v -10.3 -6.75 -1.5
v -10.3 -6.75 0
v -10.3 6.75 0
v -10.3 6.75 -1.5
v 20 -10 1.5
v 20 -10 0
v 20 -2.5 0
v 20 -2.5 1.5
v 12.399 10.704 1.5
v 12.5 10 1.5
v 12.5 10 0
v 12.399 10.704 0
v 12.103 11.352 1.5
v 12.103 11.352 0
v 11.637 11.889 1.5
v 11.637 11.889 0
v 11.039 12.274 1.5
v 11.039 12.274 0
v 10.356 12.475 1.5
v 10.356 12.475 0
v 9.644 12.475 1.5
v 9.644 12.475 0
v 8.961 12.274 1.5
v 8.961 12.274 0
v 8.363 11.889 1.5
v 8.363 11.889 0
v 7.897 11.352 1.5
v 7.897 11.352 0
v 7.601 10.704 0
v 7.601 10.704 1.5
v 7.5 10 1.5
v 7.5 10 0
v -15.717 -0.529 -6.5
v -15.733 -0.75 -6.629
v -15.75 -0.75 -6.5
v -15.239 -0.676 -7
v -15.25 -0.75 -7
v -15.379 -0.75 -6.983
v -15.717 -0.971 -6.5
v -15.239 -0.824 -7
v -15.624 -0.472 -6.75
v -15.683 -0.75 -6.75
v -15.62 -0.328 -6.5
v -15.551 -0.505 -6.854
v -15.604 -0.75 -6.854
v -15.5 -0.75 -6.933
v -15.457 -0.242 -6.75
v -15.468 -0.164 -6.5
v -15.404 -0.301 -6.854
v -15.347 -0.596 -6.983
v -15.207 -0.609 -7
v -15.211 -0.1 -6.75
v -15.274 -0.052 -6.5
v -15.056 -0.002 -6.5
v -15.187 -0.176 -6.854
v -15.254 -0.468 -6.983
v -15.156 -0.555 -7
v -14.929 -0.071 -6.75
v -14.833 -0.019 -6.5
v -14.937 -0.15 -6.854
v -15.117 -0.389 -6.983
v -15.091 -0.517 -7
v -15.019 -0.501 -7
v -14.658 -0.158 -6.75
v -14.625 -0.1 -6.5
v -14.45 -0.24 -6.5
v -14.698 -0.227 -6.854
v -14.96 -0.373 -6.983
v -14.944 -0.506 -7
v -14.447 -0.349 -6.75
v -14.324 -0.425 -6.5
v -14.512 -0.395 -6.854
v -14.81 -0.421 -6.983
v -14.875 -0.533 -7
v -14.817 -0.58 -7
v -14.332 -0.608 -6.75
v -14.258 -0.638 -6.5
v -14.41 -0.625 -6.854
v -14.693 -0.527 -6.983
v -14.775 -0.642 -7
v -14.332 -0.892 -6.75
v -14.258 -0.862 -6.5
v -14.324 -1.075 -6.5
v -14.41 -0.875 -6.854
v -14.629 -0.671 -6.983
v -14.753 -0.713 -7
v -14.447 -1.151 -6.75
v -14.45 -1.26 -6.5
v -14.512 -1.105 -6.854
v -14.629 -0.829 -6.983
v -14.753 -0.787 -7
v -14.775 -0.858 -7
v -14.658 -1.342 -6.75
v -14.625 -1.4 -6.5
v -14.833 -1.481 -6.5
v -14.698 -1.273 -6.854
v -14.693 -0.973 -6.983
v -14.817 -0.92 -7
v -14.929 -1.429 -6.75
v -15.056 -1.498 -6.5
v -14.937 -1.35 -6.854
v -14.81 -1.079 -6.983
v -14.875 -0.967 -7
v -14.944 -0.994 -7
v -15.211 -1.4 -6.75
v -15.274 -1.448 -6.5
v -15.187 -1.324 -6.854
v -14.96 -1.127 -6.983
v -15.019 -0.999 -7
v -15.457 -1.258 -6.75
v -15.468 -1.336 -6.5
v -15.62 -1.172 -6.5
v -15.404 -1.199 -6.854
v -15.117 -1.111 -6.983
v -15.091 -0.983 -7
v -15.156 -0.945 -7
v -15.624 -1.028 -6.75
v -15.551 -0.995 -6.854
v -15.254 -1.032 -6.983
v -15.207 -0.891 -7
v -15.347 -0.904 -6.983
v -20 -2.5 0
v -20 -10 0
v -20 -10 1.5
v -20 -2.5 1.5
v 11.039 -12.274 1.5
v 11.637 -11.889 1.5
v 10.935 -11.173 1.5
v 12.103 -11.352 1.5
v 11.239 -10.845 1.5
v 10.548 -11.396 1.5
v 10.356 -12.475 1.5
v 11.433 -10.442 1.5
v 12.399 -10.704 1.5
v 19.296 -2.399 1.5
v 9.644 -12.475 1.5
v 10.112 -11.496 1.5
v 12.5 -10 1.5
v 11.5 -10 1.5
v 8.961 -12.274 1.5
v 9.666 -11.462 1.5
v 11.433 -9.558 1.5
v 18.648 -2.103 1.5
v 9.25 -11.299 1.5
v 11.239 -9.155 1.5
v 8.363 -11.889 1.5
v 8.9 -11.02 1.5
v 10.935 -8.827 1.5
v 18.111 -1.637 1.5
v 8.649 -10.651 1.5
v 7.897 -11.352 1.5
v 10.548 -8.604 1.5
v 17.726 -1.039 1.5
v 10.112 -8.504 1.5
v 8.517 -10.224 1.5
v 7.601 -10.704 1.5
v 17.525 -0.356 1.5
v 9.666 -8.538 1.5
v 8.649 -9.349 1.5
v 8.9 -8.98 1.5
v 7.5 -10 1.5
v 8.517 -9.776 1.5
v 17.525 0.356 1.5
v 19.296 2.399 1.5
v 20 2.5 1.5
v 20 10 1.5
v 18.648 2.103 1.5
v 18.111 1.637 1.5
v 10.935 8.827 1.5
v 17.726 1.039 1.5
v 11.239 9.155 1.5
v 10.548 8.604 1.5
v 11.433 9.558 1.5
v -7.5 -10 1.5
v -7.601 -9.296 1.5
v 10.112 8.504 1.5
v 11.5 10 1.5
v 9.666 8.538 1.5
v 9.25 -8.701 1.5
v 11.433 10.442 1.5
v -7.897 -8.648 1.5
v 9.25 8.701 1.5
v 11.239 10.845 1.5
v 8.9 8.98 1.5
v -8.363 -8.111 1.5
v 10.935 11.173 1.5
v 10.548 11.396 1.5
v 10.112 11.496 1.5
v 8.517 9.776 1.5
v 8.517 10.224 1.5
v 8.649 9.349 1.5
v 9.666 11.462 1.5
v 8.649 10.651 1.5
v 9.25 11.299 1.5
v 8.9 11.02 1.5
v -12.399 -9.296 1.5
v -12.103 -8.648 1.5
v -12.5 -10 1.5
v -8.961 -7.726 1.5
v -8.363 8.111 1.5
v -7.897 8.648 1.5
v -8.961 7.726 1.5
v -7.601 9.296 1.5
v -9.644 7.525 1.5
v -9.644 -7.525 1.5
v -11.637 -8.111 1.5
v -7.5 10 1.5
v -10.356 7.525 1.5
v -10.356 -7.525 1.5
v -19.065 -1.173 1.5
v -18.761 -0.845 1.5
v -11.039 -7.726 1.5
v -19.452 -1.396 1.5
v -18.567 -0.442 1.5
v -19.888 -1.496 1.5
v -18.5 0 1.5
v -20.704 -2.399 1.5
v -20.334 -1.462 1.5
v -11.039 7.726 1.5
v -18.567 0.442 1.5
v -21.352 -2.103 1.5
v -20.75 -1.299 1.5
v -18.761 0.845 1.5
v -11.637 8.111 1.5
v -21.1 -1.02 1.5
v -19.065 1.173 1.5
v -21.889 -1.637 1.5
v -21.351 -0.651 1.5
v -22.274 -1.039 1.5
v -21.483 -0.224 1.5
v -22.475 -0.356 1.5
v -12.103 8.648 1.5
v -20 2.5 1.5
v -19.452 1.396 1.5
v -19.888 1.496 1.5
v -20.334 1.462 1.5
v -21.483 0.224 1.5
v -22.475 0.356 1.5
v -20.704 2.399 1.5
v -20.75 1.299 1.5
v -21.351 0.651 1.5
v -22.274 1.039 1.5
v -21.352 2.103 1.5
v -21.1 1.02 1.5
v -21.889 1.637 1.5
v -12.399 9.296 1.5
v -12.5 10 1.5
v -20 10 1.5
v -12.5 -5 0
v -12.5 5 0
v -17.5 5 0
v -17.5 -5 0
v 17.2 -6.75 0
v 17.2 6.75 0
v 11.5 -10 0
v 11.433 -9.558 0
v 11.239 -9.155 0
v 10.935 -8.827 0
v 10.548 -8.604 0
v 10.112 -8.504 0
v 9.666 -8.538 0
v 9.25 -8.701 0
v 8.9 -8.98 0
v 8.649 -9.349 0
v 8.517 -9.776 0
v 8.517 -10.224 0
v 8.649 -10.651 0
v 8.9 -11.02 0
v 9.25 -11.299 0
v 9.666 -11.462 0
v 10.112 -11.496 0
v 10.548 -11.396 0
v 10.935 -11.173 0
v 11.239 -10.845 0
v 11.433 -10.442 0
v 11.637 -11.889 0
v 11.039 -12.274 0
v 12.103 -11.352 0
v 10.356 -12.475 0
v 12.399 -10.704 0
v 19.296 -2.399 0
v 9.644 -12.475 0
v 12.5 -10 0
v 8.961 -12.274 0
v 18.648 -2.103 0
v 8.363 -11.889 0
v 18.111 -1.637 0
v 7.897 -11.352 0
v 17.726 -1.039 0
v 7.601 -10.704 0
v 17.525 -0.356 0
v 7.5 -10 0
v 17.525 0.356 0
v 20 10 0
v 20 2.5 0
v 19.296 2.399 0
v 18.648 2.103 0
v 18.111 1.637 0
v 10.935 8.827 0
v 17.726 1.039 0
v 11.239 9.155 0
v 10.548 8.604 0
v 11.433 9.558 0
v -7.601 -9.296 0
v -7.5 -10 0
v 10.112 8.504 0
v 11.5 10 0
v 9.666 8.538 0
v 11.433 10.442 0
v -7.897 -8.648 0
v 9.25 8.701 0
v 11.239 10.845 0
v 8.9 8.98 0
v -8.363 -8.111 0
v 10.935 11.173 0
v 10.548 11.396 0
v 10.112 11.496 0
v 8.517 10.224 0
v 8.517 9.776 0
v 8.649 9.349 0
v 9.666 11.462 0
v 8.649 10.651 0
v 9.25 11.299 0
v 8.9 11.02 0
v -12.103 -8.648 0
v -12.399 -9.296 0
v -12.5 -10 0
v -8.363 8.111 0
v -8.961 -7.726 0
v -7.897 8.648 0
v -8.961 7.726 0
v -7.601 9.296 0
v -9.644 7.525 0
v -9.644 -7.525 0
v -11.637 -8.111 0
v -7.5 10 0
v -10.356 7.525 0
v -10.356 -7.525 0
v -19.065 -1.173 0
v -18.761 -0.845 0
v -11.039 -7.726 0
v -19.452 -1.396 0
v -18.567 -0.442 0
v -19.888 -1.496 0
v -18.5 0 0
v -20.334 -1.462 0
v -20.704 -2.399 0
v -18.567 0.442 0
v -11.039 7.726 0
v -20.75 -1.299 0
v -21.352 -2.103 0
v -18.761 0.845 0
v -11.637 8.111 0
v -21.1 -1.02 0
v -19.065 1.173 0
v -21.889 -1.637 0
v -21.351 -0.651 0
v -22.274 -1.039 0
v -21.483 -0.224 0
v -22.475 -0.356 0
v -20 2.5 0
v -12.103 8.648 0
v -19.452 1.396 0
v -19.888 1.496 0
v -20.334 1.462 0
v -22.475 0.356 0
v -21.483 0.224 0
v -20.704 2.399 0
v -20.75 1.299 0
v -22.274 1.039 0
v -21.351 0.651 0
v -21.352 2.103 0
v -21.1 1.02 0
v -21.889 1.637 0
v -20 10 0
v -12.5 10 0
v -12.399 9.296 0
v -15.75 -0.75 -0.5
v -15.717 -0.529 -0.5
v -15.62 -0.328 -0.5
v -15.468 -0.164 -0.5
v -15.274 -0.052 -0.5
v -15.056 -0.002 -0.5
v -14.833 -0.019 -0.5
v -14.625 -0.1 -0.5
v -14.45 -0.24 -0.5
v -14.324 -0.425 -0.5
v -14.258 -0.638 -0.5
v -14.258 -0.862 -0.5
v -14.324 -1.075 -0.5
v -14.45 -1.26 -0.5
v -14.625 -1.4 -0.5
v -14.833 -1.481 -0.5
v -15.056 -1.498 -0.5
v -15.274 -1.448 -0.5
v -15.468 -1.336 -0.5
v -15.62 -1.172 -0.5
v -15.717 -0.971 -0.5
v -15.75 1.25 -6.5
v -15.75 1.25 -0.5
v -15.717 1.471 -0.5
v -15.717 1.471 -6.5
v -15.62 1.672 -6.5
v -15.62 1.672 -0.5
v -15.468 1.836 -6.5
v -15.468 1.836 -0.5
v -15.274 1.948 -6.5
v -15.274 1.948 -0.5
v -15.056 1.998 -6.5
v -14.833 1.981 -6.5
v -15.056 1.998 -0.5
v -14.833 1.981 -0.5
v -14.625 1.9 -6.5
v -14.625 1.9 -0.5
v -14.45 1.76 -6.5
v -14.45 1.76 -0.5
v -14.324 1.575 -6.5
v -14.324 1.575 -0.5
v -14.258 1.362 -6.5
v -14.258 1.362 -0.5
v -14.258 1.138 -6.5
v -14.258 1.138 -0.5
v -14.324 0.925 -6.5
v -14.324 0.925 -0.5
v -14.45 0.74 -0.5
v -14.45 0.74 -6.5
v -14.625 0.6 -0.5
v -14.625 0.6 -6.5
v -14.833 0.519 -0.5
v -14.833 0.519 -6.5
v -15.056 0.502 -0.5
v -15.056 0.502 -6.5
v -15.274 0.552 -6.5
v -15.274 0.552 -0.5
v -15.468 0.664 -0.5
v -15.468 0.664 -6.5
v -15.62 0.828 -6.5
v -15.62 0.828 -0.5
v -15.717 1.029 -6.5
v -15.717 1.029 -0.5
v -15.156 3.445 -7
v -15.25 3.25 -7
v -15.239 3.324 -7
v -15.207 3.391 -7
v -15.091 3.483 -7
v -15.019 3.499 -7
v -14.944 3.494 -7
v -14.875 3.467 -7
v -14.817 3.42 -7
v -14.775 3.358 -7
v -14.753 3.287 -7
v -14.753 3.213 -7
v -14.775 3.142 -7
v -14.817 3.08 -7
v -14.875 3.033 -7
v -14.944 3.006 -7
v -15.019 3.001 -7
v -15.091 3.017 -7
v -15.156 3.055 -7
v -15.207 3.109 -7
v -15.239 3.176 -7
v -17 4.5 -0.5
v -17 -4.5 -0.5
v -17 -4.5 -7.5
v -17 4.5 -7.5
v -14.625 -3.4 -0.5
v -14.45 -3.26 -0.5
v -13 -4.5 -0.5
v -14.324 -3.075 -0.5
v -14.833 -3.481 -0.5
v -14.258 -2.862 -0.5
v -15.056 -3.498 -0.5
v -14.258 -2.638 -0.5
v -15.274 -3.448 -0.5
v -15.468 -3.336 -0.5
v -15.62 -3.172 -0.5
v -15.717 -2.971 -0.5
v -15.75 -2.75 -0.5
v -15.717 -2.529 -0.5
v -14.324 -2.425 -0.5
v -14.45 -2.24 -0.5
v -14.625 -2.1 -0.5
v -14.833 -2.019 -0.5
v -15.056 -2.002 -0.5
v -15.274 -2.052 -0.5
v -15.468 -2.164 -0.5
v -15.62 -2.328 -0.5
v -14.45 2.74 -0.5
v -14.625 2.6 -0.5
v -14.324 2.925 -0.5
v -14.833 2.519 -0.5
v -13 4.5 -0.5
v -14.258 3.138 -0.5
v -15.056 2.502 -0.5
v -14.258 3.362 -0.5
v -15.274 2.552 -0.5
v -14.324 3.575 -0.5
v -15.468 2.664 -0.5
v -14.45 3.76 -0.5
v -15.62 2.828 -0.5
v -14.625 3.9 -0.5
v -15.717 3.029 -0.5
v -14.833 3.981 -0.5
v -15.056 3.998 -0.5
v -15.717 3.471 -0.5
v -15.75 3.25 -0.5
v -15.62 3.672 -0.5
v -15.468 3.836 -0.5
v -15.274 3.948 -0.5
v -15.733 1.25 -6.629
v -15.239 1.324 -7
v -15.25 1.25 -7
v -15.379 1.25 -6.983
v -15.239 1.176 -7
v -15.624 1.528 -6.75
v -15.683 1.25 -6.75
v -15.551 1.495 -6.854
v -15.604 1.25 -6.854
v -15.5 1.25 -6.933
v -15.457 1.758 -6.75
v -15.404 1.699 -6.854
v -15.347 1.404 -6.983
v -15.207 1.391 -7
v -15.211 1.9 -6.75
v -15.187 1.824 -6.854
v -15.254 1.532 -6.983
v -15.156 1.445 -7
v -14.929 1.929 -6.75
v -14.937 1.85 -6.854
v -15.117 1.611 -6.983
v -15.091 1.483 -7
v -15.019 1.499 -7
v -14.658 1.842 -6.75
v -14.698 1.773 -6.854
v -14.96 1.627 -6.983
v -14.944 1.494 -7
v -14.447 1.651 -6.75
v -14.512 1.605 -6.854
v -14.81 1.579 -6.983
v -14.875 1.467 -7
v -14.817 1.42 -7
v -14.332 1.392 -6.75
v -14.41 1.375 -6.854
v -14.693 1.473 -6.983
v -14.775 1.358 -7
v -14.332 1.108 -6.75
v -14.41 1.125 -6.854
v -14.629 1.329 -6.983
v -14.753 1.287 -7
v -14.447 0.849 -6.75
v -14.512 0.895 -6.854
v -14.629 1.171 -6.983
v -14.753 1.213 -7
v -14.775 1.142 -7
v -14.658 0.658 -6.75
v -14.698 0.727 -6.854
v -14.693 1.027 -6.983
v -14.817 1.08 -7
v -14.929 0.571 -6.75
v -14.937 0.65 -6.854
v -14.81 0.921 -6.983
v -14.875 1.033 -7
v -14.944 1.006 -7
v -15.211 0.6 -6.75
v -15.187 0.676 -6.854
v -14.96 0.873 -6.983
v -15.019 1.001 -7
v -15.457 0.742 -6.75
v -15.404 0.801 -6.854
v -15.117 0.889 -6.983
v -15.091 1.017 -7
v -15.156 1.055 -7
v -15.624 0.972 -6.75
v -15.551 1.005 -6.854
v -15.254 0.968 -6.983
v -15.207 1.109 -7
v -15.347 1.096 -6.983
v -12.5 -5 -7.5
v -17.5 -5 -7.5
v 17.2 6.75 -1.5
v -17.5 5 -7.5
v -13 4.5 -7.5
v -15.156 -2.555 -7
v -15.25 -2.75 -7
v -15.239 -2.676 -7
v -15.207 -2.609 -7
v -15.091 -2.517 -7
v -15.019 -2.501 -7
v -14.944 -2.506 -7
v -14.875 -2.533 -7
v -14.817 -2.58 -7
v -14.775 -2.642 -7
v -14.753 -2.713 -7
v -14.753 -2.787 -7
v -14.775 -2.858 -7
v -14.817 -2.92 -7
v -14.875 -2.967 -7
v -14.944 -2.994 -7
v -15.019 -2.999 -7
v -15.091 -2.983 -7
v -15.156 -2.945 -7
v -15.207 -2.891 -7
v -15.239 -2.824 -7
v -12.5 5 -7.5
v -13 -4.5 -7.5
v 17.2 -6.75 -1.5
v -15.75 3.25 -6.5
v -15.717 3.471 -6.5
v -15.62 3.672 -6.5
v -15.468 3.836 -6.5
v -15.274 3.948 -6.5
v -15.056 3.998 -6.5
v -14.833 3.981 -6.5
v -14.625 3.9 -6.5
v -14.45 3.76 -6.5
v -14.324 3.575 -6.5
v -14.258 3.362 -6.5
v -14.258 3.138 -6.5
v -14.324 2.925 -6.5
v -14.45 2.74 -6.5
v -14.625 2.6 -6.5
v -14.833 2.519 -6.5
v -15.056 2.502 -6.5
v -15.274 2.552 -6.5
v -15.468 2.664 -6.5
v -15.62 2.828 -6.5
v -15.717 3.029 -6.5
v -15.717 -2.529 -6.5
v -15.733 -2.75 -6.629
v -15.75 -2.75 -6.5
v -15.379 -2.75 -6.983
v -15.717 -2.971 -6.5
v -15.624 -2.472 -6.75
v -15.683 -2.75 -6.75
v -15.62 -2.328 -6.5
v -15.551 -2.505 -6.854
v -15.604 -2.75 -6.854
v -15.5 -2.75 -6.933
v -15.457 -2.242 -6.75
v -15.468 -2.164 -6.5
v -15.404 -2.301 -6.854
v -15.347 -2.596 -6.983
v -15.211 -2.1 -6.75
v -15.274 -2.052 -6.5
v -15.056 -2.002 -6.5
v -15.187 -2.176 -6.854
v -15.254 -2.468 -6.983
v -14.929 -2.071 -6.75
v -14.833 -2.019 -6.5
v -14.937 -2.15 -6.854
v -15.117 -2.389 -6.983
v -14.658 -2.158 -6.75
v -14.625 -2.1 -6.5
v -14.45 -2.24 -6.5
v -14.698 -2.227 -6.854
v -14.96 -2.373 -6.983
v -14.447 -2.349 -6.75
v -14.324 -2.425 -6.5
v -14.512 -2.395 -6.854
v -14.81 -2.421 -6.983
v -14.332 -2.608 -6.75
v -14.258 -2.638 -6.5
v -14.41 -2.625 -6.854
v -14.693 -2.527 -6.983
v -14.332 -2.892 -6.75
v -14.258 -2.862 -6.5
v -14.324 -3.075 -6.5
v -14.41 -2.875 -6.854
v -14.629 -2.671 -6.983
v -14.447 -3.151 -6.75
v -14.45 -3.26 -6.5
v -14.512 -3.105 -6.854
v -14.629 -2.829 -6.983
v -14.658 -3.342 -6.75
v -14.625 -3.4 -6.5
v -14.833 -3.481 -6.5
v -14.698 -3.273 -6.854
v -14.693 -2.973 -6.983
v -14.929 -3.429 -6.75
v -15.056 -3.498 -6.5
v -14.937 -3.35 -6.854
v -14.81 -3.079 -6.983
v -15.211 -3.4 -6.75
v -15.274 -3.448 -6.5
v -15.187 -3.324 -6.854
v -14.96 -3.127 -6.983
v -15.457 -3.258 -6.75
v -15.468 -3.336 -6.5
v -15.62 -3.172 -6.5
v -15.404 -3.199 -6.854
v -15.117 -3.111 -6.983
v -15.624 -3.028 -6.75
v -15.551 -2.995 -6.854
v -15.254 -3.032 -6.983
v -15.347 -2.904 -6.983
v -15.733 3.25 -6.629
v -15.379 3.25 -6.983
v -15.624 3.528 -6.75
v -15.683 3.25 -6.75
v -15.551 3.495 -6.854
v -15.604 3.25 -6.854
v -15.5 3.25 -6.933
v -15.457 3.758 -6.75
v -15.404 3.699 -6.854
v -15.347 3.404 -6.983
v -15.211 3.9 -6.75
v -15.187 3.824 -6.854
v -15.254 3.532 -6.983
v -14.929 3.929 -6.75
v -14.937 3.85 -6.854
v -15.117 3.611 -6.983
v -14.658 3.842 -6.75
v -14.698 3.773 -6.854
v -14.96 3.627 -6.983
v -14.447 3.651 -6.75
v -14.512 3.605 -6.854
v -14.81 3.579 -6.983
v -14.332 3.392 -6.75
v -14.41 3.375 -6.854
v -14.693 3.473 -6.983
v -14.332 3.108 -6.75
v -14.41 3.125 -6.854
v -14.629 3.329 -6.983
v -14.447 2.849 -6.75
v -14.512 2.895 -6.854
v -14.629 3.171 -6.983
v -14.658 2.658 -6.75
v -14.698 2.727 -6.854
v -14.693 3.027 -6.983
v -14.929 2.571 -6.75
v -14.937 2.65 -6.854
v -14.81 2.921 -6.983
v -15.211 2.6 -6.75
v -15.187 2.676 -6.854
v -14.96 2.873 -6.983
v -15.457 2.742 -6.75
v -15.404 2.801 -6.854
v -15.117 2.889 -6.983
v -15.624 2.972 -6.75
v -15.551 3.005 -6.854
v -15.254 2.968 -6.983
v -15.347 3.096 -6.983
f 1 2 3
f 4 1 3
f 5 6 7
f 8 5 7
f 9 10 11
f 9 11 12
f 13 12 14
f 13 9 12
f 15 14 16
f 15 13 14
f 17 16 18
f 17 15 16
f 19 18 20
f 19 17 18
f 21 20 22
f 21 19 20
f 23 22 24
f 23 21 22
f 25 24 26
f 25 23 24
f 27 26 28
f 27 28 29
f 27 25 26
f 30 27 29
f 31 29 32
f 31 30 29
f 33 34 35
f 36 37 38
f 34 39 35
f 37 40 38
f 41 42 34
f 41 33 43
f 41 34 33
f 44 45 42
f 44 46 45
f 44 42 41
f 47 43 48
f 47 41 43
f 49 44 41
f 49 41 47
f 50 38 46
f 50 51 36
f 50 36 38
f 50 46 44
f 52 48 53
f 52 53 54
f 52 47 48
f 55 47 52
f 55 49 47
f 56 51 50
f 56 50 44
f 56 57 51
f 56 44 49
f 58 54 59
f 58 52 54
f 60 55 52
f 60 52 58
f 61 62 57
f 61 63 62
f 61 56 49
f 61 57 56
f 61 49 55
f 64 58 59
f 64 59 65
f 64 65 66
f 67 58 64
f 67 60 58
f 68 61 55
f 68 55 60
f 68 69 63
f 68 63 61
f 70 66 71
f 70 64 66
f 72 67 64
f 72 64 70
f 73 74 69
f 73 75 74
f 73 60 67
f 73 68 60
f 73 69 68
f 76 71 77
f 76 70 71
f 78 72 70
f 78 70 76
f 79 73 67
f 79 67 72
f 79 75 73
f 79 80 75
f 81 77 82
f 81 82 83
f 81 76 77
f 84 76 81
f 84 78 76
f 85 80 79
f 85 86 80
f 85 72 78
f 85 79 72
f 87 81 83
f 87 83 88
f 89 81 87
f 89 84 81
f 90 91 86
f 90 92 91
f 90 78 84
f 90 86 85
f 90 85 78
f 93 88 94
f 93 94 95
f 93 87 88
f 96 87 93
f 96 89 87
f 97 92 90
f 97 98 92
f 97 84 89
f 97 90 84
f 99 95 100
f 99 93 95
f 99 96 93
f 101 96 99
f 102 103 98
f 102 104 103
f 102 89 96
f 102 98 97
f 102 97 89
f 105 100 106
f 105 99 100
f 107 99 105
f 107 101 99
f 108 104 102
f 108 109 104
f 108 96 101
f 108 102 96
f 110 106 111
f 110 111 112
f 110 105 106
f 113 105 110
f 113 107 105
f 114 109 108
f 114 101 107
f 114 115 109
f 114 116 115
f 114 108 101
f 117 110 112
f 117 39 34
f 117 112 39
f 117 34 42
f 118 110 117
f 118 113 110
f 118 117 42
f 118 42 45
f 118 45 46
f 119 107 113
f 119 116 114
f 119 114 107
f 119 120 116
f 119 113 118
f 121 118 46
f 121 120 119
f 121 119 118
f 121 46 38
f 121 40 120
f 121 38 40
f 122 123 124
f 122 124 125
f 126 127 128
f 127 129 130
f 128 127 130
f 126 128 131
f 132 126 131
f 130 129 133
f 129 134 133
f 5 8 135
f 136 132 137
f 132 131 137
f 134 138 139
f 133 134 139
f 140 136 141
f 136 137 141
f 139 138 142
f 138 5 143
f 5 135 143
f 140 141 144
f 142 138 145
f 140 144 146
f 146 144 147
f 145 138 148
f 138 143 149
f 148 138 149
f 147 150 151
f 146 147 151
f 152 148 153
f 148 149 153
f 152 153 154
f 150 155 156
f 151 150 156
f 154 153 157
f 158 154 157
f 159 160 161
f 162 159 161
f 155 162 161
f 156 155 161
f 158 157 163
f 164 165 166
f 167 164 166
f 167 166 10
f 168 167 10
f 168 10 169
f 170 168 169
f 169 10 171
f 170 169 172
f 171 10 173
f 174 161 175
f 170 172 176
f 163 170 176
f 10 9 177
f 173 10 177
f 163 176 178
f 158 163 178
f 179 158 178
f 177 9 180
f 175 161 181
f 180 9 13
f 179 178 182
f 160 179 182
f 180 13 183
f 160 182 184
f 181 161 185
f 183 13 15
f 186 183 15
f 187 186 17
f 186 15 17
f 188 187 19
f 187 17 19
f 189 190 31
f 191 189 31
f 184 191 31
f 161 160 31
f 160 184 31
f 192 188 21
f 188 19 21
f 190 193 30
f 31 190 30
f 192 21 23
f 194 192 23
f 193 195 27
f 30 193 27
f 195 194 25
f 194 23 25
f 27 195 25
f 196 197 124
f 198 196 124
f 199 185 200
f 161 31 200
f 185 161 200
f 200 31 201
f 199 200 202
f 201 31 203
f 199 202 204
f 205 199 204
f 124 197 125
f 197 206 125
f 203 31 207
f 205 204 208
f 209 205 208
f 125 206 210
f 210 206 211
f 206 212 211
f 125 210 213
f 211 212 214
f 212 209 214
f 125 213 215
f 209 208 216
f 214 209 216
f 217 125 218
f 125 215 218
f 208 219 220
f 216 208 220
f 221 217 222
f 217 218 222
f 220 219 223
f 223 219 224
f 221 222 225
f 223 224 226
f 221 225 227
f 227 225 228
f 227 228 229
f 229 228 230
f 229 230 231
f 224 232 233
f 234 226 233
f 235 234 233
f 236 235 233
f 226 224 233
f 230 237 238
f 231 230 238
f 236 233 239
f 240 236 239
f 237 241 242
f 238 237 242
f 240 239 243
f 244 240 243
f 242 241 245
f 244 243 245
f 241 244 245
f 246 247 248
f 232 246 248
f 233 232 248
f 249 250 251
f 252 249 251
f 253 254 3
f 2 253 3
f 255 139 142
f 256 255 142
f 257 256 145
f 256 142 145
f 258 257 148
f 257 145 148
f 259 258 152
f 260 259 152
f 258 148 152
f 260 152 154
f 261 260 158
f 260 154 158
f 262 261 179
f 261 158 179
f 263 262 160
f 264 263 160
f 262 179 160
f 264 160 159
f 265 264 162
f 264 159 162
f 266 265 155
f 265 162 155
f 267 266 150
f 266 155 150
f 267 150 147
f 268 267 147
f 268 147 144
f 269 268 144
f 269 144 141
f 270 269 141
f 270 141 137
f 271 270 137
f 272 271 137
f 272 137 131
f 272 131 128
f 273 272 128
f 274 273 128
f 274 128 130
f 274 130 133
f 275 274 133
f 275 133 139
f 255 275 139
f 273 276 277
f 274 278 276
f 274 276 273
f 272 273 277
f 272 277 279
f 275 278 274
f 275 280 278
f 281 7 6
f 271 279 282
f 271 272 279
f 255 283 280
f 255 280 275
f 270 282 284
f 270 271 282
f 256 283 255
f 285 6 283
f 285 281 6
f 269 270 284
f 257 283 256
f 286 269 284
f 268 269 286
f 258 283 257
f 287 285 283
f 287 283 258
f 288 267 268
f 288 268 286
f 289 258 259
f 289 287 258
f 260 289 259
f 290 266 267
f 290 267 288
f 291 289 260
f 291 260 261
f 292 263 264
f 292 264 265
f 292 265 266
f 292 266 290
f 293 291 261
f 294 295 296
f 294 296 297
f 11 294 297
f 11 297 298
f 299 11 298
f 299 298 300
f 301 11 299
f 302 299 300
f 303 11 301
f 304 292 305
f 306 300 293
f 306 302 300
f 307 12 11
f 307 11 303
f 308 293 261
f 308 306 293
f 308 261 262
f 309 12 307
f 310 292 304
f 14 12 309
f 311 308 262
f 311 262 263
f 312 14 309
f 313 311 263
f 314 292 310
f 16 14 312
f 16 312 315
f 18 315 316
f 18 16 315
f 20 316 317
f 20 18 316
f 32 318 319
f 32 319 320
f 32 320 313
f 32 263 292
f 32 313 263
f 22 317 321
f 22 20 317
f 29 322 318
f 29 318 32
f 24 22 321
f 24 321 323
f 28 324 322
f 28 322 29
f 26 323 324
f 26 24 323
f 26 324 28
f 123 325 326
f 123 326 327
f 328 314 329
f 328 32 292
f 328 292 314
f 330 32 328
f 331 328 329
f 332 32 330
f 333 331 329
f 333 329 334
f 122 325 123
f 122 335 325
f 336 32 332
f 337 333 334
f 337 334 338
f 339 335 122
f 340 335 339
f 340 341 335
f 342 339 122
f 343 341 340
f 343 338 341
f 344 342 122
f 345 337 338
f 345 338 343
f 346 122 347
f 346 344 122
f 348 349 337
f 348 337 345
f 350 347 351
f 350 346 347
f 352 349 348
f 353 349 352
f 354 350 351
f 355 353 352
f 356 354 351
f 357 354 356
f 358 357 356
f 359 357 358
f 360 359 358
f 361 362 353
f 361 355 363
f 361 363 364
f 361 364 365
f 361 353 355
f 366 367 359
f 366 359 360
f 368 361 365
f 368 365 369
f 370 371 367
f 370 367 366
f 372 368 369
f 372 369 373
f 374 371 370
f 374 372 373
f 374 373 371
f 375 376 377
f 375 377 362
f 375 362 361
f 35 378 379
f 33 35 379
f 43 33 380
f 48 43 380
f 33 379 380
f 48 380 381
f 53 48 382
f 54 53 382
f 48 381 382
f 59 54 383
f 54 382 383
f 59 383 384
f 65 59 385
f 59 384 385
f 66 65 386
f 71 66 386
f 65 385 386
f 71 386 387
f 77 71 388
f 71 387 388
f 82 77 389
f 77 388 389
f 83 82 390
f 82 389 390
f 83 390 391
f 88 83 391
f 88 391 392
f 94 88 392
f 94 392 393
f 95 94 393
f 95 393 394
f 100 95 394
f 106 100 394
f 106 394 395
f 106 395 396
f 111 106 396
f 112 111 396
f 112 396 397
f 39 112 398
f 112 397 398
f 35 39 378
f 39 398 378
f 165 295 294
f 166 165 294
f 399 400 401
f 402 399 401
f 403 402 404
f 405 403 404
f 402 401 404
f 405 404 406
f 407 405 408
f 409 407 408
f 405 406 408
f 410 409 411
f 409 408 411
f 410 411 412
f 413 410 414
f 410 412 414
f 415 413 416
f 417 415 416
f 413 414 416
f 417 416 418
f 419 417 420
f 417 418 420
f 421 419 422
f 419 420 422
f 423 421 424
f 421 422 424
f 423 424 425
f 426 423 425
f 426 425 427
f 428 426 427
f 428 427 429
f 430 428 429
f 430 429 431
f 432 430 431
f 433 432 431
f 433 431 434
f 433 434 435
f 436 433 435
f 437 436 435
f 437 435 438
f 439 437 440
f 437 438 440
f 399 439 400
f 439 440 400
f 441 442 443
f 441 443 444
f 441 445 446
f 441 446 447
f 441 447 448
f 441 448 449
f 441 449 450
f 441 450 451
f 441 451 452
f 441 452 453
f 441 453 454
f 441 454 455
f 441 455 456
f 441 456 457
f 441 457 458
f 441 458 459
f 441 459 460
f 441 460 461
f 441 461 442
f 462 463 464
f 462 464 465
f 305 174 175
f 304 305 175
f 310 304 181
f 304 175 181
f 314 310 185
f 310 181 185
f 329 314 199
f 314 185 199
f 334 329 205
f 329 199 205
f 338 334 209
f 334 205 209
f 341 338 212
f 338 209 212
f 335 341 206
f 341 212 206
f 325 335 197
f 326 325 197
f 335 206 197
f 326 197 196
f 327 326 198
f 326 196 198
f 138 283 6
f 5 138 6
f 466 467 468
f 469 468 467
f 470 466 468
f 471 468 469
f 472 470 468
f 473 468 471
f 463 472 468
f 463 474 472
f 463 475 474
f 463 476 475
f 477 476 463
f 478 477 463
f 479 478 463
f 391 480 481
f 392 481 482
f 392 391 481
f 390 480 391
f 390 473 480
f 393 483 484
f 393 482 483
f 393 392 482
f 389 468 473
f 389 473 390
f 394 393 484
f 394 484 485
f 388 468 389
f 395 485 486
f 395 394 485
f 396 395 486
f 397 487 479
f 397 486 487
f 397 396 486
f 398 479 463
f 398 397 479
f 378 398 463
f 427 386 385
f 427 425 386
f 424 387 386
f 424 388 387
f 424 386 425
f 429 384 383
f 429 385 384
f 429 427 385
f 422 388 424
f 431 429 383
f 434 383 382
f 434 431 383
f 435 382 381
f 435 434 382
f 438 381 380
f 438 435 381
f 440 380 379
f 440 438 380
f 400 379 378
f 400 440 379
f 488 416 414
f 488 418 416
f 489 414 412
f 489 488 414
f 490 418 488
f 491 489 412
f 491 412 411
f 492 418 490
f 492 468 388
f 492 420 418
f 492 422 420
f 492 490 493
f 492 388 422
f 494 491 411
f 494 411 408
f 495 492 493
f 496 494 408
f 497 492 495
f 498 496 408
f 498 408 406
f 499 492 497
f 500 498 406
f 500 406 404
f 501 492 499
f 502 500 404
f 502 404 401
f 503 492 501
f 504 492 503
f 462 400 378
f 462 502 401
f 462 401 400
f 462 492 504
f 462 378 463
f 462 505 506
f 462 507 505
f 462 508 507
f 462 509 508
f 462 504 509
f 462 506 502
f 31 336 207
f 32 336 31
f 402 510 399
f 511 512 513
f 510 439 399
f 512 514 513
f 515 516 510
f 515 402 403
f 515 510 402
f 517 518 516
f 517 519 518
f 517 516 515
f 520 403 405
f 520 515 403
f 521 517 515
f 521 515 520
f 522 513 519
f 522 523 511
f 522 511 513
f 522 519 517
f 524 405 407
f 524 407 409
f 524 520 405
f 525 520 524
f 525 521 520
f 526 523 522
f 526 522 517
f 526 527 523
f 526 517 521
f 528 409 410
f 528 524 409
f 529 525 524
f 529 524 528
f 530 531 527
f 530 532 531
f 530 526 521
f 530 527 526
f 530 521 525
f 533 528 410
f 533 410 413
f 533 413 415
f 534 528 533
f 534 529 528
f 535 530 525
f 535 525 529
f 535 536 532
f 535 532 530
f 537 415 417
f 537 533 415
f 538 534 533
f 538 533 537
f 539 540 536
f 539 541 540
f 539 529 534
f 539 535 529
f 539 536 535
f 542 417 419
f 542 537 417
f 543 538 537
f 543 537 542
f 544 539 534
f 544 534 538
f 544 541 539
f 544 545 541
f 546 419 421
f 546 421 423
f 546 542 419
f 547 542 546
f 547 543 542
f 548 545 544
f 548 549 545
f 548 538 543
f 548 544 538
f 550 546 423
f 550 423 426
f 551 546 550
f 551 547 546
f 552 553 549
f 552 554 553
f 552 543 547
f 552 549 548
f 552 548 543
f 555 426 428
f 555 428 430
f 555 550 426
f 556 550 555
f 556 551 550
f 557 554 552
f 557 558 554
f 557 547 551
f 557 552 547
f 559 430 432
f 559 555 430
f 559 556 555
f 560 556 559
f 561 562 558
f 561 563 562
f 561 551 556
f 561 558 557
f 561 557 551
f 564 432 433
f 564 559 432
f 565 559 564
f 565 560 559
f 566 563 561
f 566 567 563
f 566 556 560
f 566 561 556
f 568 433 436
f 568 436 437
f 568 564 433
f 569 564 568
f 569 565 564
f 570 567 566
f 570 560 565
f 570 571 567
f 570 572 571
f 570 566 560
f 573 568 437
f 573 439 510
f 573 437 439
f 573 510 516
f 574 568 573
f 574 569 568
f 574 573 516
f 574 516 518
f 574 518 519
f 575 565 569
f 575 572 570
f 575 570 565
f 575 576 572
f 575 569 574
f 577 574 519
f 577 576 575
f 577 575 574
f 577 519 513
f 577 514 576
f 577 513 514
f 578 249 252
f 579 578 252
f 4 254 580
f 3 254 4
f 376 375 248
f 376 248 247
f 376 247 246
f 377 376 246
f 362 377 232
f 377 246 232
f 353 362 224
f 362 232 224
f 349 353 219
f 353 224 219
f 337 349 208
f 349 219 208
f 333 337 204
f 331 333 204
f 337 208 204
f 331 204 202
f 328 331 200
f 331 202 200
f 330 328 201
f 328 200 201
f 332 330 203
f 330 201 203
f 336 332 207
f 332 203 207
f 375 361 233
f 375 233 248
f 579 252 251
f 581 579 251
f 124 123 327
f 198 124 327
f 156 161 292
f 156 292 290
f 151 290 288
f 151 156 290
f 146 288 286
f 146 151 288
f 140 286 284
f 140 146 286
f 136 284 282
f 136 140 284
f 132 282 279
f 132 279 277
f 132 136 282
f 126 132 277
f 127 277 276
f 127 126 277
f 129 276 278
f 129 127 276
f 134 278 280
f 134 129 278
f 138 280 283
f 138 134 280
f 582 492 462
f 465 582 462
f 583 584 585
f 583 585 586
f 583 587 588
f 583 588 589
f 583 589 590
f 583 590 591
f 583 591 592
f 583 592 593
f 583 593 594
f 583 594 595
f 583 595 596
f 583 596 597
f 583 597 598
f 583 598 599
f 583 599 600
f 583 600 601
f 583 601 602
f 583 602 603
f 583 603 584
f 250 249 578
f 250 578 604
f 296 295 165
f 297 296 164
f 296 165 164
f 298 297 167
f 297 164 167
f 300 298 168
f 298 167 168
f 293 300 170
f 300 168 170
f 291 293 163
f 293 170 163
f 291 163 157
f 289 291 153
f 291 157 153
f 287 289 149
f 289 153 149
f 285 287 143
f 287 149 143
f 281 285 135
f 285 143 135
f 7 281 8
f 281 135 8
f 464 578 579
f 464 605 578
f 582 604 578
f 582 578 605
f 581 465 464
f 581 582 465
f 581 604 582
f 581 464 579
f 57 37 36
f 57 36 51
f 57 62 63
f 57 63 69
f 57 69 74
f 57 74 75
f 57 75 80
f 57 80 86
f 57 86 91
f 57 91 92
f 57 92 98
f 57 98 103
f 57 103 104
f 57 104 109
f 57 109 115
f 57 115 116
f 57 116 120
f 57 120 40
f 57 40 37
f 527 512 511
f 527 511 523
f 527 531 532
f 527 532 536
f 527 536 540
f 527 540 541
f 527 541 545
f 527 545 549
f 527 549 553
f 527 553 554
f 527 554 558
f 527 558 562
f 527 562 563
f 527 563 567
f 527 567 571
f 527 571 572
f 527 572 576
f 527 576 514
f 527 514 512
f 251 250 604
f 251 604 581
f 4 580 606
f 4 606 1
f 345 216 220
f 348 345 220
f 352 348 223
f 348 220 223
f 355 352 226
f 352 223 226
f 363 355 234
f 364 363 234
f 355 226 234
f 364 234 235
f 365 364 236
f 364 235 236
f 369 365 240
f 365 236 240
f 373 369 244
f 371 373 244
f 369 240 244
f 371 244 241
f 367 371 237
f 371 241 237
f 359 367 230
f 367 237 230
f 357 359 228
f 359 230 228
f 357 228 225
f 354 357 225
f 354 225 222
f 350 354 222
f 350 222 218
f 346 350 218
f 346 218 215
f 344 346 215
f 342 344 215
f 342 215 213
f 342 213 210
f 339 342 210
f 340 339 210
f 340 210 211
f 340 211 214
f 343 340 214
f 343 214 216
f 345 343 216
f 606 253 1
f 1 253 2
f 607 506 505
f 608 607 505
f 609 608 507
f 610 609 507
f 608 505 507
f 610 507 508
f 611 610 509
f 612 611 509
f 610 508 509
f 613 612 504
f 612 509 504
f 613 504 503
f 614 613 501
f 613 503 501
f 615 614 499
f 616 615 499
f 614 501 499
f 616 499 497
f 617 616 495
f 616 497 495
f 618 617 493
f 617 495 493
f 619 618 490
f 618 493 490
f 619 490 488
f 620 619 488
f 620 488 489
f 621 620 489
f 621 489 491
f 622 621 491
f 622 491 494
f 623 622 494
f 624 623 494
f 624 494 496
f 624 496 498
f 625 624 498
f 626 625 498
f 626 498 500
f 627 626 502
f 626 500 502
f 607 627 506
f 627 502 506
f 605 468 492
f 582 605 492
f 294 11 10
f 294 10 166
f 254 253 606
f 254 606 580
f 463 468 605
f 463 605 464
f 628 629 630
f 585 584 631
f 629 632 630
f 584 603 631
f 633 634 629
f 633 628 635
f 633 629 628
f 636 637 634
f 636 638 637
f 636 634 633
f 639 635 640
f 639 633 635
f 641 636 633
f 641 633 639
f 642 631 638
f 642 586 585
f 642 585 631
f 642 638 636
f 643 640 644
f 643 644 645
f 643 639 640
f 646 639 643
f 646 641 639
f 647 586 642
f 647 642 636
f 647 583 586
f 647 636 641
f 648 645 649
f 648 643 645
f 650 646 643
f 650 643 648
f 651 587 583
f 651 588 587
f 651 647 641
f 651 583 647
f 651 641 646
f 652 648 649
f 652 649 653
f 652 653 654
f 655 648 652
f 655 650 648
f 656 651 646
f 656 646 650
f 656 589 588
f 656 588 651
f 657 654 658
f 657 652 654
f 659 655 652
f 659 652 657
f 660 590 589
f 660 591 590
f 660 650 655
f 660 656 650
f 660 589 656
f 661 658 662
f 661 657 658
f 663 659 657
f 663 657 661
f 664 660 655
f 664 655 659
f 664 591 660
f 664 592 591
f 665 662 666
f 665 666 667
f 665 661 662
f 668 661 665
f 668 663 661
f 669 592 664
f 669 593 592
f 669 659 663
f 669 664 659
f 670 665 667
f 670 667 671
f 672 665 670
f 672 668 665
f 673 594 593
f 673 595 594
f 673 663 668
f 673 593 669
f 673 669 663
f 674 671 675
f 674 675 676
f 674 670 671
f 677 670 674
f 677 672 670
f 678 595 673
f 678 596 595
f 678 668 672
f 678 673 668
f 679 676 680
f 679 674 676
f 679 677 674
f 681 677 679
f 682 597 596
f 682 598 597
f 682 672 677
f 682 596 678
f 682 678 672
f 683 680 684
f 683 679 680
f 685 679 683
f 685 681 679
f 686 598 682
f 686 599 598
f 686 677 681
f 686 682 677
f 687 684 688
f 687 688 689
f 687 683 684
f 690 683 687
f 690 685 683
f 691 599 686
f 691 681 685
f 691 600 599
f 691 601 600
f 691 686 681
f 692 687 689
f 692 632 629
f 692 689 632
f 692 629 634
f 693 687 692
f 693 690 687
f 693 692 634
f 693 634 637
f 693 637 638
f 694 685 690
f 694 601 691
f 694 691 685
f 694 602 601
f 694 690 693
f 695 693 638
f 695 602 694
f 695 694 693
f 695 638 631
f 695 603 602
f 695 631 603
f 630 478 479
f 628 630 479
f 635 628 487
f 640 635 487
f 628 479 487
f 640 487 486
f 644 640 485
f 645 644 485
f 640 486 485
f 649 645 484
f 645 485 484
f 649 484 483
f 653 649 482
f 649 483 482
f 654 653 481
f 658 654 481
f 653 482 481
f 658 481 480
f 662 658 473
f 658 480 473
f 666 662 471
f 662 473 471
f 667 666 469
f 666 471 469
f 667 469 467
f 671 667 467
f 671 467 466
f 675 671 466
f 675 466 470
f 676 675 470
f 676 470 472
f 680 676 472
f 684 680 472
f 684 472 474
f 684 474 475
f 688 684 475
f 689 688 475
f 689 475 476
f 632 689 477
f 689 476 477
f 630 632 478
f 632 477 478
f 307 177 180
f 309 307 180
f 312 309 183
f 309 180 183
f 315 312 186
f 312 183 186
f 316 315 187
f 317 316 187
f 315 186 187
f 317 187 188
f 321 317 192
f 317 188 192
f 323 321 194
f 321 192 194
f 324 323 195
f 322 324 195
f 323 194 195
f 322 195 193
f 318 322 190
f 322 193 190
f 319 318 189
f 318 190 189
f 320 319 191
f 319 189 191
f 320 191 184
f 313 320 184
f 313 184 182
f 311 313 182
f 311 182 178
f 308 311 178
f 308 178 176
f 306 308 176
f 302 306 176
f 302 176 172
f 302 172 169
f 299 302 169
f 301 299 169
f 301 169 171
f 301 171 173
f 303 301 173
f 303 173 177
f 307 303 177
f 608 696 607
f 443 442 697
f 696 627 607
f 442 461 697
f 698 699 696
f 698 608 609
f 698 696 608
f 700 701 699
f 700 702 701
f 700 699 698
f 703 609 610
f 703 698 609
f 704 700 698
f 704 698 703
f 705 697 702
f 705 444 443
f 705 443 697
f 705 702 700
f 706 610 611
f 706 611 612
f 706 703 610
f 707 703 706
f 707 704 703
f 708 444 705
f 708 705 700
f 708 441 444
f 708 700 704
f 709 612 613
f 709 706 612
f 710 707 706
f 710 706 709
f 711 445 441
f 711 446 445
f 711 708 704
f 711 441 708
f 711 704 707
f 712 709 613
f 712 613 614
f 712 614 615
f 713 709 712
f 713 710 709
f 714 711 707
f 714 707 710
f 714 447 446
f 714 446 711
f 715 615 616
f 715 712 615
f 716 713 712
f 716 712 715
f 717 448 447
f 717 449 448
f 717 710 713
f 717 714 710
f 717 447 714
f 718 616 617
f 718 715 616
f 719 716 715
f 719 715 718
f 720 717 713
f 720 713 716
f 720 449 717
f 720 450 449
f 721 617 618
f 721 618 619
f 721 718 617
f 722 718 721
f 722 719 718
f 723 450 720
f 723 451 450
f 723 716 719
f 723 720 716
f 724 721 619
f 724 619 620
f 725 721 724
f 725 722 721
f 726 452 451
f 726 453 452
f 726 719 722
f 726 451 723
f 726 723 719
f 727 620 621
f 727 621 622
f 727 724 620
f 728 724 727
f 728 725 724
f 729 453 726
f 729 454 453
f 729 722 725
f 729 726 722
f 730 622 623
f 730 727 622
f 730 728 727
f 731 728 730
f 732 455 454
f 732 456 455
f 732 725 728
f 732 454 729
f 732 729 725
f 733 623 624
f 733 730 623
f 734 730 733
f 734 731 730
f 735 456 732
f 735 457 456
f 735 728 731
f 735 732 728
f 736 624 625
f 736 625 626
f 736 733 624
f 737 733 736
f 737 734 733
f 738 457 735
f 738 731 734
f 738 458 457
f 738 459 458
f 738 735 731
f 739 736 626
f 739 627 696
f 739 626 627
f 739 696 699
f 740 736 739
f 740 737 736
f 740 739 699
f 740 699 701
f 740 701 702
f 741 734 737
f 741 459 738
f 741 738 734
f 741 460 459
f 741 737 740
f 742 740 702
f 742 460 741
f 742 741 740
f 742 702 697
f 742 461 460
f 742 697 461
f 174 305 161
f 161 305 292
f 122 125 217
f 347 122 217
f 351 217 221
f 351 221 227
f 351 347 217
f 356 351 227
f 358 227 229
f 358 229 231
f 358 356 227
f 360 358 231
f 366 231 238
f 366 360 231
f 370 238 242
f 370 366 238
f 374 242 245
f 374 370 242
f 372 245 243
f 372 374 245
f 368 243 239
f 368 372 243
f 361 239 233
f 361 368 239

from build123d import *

# Parameters (mm, degrees)
SKIZZE1_W                       = 40
SKIZZE1_H                       = 20
AUFSATZ_LINEAR_AUSTRAGEN1_DEPTH = 1.5
SKIZZE2_R                       = 2.5
SCHNITT_LINEAR_AUSTRAGEN1_DEPTH = 2.5
SKIZZE3_R                       = 2.5
SCHNITT_LINEAR_AUSTRAGEN2_DEPTH = 2.5
SKIZZE4_R                       = 2.5
AUFSATZ_LINEAR_AUSTRAGEN2_DEPTH = 1.5
SKIZZE5_R                       = 2.5
AUFSATZ_LINEAR_AUSTRAGEN3_DEPTH = 1.5
SKIZZE6_R                       = 1.5
SCHNITT_LINEAR_AUSTRAGEN3_DEPTH = 2.5
SKIZZE7_W                       = 27.5
SKIZZE7_H                       = 13.5
AUFSATZ_LINEAR_AUSTRAGEN4_DEPTH = 1.5
SKIZZE8_W                       = 5
SKIZZE8_H                       = 10
AUFSATZ_LINEAR_AUSTRAGEN5_DEPTH = 7.5
WANDUNG1_T                      = -0.5
SKIZZE10_R                      = 0.75
AUFSATZ_LINEAR_AUSTRAGEN6_DEPTH = 6.5
VERRUNDUNG1_R                   = 0.5


with BuildPart() as part:
    # Skizze1 → Aufsatz-Linear austragen1 (new body)
    with BuildSketch(Plane.XY):
        Rectangle(SKIZZE1_W, SKIZZE1_H)
    extrude(amount=AUFSATZ_LINEAR_AUSTRAGEN1_DEPTH)

    # Skizze2 → Schnitt-Linear austragen1 (cut, through all)
    with BuildSketch(Plane.XY.offset(1.5)):
        with Locations((20, 0)):
            Circle(SKIZZE2_R)
    extrude(amount=-SCHNITT_LINEAR_AUSTRAGEN1_DEPTH, mode=Mode.SUBTRACT)

    # Skizze3 → Schnitt-Linear austragen2 (cut, through all)
    with BuildSketch(Plane.XY.offset(1.5)):
        with Locations((-10, 10)):
            Circle(SKIZZE3_R)
        with Locations((-10, -10)):
            Circle(SKIZZE3_R)
    extrude(amount=-SCHNITT_LINEAR_AUSTRAGEN2_DEPTH, mode=Mode.SUBTRACT)

    # Skizze4 → Aufsatz-Linear austragen2 (add)
    with BuildSketch(Plane.XY.offset(1.5)):
        with Locations((10, 10)):
            Circle(SKIZZE4_R)
        with Locations((10, -10)):
            Circle(SKIZZE4_R)
    extrude(amount=-AUFSATZ_LINEAR_AUSTRAGEN2_DEPTH)

    # Skizze5 → Aufsatz-Linear austragen3 (add)
    with BuildSketch(Plane(origin=(0, 0, 0), x_dir=(-1, 0, 0), z_dir=(0, 0, -1))):
        with Locations((20, 0)):
            Circle(SKIZZE5_R)
    extrude(amount=-AUFSATZ_LINEAR_AUSTRAGEN3_DEPTH)

    # Skizze6 → Schnitt-Linear austragen3 (cut, through all)
    with BuildSketch(Plane.XY.offset(1.5)):
        with Locations((-20, 0)):
            Circle(SKIZZE6_R)
        with Locations((10, 10)):
            Circle(SKIZZE6_R)
        with Locations((10, -10)):
            Circle(SKIZZE6_R)
    extrude(amount=-SCHNITT_LINEAR_AUSTRAGEN3_DEPTH, mode=Mode.SUBTRACT)


with BuildPart() as body_2:
    # Skizze7 → Aufsatz-Linear austragen4 (new body)
    with BuildSketch(Plane(origin=(0, 0, 0), x_dir=(-1, 0, 0), z_dir=(0, 0, -1))):
        with Locations((-3.45, 0)):
            Rectangle(SKIZZE7_W, SKIZZE7_H)
    extrude(amount=AUFSATZ_LINEAR_AUSTRAGEN4_DEPTH)


with BuildPart() as body_3:
    # Skizze8 → Aufsatz-Linear austragen5 (new body)
    with BuildSketch(Plane(origin=(0, 0, 0), x_dir=(-1, 0, 0), z_dir=(0, 0, -1))):
        with Locations((15, 0)):
            Rectangle(SKIZZE8_W, SKIZZE8_H)
    extrude(amount=AUFSATZ_LINEAR_AUSTRAGEN5_DEPTH)

    # Wandung1
    wandung1_openings = [body_3.faces().sort_by_distance(p)[0] for p in [
        (-15, 0, -7.5),
    ]]
    offset(amount=WANDUNG1_T, openings=wandung1_openings, kind=Kind.INTERSECTION)

    # Skizze10 → Aufsatz-Linear austragen6 (add)
    with BuildSketch(Plane(origin=(0, 0, -0.5), x_dir=(-1, 0, 0), z_dir=(0, 0, -1))):
        with Locations((15, -2.75)):
            Circle(SKIZZE10_R)
        with Locations((15, -0.75)):
            Circle(SKIZZE10_R)
        with Locations((15, 1.25)):
            Circle(SKIZZE10_R)
        with Locations((15, 3.25)):
            Circle(SKIZZE10_R)
    extrude(amount=AUFSATZ_LINEAR_AUSTRAGEN6_DEPTH)

    # Verrundung1
    verrundung1_edges = [body_3.edges().sort_by_distance(p)[0] for p in [
        (-14.25, -2.75, -7),
        (-14.25, -0.75, -7),
        (-14.25, 1.25, -7),
        (-14.25, 3.25, -7),
    ]]
    fillet(verrundung1_edges, radius=VERRUNDUNG1_R)


solid = Compound([part.part, body_2.part, body_3.part])
